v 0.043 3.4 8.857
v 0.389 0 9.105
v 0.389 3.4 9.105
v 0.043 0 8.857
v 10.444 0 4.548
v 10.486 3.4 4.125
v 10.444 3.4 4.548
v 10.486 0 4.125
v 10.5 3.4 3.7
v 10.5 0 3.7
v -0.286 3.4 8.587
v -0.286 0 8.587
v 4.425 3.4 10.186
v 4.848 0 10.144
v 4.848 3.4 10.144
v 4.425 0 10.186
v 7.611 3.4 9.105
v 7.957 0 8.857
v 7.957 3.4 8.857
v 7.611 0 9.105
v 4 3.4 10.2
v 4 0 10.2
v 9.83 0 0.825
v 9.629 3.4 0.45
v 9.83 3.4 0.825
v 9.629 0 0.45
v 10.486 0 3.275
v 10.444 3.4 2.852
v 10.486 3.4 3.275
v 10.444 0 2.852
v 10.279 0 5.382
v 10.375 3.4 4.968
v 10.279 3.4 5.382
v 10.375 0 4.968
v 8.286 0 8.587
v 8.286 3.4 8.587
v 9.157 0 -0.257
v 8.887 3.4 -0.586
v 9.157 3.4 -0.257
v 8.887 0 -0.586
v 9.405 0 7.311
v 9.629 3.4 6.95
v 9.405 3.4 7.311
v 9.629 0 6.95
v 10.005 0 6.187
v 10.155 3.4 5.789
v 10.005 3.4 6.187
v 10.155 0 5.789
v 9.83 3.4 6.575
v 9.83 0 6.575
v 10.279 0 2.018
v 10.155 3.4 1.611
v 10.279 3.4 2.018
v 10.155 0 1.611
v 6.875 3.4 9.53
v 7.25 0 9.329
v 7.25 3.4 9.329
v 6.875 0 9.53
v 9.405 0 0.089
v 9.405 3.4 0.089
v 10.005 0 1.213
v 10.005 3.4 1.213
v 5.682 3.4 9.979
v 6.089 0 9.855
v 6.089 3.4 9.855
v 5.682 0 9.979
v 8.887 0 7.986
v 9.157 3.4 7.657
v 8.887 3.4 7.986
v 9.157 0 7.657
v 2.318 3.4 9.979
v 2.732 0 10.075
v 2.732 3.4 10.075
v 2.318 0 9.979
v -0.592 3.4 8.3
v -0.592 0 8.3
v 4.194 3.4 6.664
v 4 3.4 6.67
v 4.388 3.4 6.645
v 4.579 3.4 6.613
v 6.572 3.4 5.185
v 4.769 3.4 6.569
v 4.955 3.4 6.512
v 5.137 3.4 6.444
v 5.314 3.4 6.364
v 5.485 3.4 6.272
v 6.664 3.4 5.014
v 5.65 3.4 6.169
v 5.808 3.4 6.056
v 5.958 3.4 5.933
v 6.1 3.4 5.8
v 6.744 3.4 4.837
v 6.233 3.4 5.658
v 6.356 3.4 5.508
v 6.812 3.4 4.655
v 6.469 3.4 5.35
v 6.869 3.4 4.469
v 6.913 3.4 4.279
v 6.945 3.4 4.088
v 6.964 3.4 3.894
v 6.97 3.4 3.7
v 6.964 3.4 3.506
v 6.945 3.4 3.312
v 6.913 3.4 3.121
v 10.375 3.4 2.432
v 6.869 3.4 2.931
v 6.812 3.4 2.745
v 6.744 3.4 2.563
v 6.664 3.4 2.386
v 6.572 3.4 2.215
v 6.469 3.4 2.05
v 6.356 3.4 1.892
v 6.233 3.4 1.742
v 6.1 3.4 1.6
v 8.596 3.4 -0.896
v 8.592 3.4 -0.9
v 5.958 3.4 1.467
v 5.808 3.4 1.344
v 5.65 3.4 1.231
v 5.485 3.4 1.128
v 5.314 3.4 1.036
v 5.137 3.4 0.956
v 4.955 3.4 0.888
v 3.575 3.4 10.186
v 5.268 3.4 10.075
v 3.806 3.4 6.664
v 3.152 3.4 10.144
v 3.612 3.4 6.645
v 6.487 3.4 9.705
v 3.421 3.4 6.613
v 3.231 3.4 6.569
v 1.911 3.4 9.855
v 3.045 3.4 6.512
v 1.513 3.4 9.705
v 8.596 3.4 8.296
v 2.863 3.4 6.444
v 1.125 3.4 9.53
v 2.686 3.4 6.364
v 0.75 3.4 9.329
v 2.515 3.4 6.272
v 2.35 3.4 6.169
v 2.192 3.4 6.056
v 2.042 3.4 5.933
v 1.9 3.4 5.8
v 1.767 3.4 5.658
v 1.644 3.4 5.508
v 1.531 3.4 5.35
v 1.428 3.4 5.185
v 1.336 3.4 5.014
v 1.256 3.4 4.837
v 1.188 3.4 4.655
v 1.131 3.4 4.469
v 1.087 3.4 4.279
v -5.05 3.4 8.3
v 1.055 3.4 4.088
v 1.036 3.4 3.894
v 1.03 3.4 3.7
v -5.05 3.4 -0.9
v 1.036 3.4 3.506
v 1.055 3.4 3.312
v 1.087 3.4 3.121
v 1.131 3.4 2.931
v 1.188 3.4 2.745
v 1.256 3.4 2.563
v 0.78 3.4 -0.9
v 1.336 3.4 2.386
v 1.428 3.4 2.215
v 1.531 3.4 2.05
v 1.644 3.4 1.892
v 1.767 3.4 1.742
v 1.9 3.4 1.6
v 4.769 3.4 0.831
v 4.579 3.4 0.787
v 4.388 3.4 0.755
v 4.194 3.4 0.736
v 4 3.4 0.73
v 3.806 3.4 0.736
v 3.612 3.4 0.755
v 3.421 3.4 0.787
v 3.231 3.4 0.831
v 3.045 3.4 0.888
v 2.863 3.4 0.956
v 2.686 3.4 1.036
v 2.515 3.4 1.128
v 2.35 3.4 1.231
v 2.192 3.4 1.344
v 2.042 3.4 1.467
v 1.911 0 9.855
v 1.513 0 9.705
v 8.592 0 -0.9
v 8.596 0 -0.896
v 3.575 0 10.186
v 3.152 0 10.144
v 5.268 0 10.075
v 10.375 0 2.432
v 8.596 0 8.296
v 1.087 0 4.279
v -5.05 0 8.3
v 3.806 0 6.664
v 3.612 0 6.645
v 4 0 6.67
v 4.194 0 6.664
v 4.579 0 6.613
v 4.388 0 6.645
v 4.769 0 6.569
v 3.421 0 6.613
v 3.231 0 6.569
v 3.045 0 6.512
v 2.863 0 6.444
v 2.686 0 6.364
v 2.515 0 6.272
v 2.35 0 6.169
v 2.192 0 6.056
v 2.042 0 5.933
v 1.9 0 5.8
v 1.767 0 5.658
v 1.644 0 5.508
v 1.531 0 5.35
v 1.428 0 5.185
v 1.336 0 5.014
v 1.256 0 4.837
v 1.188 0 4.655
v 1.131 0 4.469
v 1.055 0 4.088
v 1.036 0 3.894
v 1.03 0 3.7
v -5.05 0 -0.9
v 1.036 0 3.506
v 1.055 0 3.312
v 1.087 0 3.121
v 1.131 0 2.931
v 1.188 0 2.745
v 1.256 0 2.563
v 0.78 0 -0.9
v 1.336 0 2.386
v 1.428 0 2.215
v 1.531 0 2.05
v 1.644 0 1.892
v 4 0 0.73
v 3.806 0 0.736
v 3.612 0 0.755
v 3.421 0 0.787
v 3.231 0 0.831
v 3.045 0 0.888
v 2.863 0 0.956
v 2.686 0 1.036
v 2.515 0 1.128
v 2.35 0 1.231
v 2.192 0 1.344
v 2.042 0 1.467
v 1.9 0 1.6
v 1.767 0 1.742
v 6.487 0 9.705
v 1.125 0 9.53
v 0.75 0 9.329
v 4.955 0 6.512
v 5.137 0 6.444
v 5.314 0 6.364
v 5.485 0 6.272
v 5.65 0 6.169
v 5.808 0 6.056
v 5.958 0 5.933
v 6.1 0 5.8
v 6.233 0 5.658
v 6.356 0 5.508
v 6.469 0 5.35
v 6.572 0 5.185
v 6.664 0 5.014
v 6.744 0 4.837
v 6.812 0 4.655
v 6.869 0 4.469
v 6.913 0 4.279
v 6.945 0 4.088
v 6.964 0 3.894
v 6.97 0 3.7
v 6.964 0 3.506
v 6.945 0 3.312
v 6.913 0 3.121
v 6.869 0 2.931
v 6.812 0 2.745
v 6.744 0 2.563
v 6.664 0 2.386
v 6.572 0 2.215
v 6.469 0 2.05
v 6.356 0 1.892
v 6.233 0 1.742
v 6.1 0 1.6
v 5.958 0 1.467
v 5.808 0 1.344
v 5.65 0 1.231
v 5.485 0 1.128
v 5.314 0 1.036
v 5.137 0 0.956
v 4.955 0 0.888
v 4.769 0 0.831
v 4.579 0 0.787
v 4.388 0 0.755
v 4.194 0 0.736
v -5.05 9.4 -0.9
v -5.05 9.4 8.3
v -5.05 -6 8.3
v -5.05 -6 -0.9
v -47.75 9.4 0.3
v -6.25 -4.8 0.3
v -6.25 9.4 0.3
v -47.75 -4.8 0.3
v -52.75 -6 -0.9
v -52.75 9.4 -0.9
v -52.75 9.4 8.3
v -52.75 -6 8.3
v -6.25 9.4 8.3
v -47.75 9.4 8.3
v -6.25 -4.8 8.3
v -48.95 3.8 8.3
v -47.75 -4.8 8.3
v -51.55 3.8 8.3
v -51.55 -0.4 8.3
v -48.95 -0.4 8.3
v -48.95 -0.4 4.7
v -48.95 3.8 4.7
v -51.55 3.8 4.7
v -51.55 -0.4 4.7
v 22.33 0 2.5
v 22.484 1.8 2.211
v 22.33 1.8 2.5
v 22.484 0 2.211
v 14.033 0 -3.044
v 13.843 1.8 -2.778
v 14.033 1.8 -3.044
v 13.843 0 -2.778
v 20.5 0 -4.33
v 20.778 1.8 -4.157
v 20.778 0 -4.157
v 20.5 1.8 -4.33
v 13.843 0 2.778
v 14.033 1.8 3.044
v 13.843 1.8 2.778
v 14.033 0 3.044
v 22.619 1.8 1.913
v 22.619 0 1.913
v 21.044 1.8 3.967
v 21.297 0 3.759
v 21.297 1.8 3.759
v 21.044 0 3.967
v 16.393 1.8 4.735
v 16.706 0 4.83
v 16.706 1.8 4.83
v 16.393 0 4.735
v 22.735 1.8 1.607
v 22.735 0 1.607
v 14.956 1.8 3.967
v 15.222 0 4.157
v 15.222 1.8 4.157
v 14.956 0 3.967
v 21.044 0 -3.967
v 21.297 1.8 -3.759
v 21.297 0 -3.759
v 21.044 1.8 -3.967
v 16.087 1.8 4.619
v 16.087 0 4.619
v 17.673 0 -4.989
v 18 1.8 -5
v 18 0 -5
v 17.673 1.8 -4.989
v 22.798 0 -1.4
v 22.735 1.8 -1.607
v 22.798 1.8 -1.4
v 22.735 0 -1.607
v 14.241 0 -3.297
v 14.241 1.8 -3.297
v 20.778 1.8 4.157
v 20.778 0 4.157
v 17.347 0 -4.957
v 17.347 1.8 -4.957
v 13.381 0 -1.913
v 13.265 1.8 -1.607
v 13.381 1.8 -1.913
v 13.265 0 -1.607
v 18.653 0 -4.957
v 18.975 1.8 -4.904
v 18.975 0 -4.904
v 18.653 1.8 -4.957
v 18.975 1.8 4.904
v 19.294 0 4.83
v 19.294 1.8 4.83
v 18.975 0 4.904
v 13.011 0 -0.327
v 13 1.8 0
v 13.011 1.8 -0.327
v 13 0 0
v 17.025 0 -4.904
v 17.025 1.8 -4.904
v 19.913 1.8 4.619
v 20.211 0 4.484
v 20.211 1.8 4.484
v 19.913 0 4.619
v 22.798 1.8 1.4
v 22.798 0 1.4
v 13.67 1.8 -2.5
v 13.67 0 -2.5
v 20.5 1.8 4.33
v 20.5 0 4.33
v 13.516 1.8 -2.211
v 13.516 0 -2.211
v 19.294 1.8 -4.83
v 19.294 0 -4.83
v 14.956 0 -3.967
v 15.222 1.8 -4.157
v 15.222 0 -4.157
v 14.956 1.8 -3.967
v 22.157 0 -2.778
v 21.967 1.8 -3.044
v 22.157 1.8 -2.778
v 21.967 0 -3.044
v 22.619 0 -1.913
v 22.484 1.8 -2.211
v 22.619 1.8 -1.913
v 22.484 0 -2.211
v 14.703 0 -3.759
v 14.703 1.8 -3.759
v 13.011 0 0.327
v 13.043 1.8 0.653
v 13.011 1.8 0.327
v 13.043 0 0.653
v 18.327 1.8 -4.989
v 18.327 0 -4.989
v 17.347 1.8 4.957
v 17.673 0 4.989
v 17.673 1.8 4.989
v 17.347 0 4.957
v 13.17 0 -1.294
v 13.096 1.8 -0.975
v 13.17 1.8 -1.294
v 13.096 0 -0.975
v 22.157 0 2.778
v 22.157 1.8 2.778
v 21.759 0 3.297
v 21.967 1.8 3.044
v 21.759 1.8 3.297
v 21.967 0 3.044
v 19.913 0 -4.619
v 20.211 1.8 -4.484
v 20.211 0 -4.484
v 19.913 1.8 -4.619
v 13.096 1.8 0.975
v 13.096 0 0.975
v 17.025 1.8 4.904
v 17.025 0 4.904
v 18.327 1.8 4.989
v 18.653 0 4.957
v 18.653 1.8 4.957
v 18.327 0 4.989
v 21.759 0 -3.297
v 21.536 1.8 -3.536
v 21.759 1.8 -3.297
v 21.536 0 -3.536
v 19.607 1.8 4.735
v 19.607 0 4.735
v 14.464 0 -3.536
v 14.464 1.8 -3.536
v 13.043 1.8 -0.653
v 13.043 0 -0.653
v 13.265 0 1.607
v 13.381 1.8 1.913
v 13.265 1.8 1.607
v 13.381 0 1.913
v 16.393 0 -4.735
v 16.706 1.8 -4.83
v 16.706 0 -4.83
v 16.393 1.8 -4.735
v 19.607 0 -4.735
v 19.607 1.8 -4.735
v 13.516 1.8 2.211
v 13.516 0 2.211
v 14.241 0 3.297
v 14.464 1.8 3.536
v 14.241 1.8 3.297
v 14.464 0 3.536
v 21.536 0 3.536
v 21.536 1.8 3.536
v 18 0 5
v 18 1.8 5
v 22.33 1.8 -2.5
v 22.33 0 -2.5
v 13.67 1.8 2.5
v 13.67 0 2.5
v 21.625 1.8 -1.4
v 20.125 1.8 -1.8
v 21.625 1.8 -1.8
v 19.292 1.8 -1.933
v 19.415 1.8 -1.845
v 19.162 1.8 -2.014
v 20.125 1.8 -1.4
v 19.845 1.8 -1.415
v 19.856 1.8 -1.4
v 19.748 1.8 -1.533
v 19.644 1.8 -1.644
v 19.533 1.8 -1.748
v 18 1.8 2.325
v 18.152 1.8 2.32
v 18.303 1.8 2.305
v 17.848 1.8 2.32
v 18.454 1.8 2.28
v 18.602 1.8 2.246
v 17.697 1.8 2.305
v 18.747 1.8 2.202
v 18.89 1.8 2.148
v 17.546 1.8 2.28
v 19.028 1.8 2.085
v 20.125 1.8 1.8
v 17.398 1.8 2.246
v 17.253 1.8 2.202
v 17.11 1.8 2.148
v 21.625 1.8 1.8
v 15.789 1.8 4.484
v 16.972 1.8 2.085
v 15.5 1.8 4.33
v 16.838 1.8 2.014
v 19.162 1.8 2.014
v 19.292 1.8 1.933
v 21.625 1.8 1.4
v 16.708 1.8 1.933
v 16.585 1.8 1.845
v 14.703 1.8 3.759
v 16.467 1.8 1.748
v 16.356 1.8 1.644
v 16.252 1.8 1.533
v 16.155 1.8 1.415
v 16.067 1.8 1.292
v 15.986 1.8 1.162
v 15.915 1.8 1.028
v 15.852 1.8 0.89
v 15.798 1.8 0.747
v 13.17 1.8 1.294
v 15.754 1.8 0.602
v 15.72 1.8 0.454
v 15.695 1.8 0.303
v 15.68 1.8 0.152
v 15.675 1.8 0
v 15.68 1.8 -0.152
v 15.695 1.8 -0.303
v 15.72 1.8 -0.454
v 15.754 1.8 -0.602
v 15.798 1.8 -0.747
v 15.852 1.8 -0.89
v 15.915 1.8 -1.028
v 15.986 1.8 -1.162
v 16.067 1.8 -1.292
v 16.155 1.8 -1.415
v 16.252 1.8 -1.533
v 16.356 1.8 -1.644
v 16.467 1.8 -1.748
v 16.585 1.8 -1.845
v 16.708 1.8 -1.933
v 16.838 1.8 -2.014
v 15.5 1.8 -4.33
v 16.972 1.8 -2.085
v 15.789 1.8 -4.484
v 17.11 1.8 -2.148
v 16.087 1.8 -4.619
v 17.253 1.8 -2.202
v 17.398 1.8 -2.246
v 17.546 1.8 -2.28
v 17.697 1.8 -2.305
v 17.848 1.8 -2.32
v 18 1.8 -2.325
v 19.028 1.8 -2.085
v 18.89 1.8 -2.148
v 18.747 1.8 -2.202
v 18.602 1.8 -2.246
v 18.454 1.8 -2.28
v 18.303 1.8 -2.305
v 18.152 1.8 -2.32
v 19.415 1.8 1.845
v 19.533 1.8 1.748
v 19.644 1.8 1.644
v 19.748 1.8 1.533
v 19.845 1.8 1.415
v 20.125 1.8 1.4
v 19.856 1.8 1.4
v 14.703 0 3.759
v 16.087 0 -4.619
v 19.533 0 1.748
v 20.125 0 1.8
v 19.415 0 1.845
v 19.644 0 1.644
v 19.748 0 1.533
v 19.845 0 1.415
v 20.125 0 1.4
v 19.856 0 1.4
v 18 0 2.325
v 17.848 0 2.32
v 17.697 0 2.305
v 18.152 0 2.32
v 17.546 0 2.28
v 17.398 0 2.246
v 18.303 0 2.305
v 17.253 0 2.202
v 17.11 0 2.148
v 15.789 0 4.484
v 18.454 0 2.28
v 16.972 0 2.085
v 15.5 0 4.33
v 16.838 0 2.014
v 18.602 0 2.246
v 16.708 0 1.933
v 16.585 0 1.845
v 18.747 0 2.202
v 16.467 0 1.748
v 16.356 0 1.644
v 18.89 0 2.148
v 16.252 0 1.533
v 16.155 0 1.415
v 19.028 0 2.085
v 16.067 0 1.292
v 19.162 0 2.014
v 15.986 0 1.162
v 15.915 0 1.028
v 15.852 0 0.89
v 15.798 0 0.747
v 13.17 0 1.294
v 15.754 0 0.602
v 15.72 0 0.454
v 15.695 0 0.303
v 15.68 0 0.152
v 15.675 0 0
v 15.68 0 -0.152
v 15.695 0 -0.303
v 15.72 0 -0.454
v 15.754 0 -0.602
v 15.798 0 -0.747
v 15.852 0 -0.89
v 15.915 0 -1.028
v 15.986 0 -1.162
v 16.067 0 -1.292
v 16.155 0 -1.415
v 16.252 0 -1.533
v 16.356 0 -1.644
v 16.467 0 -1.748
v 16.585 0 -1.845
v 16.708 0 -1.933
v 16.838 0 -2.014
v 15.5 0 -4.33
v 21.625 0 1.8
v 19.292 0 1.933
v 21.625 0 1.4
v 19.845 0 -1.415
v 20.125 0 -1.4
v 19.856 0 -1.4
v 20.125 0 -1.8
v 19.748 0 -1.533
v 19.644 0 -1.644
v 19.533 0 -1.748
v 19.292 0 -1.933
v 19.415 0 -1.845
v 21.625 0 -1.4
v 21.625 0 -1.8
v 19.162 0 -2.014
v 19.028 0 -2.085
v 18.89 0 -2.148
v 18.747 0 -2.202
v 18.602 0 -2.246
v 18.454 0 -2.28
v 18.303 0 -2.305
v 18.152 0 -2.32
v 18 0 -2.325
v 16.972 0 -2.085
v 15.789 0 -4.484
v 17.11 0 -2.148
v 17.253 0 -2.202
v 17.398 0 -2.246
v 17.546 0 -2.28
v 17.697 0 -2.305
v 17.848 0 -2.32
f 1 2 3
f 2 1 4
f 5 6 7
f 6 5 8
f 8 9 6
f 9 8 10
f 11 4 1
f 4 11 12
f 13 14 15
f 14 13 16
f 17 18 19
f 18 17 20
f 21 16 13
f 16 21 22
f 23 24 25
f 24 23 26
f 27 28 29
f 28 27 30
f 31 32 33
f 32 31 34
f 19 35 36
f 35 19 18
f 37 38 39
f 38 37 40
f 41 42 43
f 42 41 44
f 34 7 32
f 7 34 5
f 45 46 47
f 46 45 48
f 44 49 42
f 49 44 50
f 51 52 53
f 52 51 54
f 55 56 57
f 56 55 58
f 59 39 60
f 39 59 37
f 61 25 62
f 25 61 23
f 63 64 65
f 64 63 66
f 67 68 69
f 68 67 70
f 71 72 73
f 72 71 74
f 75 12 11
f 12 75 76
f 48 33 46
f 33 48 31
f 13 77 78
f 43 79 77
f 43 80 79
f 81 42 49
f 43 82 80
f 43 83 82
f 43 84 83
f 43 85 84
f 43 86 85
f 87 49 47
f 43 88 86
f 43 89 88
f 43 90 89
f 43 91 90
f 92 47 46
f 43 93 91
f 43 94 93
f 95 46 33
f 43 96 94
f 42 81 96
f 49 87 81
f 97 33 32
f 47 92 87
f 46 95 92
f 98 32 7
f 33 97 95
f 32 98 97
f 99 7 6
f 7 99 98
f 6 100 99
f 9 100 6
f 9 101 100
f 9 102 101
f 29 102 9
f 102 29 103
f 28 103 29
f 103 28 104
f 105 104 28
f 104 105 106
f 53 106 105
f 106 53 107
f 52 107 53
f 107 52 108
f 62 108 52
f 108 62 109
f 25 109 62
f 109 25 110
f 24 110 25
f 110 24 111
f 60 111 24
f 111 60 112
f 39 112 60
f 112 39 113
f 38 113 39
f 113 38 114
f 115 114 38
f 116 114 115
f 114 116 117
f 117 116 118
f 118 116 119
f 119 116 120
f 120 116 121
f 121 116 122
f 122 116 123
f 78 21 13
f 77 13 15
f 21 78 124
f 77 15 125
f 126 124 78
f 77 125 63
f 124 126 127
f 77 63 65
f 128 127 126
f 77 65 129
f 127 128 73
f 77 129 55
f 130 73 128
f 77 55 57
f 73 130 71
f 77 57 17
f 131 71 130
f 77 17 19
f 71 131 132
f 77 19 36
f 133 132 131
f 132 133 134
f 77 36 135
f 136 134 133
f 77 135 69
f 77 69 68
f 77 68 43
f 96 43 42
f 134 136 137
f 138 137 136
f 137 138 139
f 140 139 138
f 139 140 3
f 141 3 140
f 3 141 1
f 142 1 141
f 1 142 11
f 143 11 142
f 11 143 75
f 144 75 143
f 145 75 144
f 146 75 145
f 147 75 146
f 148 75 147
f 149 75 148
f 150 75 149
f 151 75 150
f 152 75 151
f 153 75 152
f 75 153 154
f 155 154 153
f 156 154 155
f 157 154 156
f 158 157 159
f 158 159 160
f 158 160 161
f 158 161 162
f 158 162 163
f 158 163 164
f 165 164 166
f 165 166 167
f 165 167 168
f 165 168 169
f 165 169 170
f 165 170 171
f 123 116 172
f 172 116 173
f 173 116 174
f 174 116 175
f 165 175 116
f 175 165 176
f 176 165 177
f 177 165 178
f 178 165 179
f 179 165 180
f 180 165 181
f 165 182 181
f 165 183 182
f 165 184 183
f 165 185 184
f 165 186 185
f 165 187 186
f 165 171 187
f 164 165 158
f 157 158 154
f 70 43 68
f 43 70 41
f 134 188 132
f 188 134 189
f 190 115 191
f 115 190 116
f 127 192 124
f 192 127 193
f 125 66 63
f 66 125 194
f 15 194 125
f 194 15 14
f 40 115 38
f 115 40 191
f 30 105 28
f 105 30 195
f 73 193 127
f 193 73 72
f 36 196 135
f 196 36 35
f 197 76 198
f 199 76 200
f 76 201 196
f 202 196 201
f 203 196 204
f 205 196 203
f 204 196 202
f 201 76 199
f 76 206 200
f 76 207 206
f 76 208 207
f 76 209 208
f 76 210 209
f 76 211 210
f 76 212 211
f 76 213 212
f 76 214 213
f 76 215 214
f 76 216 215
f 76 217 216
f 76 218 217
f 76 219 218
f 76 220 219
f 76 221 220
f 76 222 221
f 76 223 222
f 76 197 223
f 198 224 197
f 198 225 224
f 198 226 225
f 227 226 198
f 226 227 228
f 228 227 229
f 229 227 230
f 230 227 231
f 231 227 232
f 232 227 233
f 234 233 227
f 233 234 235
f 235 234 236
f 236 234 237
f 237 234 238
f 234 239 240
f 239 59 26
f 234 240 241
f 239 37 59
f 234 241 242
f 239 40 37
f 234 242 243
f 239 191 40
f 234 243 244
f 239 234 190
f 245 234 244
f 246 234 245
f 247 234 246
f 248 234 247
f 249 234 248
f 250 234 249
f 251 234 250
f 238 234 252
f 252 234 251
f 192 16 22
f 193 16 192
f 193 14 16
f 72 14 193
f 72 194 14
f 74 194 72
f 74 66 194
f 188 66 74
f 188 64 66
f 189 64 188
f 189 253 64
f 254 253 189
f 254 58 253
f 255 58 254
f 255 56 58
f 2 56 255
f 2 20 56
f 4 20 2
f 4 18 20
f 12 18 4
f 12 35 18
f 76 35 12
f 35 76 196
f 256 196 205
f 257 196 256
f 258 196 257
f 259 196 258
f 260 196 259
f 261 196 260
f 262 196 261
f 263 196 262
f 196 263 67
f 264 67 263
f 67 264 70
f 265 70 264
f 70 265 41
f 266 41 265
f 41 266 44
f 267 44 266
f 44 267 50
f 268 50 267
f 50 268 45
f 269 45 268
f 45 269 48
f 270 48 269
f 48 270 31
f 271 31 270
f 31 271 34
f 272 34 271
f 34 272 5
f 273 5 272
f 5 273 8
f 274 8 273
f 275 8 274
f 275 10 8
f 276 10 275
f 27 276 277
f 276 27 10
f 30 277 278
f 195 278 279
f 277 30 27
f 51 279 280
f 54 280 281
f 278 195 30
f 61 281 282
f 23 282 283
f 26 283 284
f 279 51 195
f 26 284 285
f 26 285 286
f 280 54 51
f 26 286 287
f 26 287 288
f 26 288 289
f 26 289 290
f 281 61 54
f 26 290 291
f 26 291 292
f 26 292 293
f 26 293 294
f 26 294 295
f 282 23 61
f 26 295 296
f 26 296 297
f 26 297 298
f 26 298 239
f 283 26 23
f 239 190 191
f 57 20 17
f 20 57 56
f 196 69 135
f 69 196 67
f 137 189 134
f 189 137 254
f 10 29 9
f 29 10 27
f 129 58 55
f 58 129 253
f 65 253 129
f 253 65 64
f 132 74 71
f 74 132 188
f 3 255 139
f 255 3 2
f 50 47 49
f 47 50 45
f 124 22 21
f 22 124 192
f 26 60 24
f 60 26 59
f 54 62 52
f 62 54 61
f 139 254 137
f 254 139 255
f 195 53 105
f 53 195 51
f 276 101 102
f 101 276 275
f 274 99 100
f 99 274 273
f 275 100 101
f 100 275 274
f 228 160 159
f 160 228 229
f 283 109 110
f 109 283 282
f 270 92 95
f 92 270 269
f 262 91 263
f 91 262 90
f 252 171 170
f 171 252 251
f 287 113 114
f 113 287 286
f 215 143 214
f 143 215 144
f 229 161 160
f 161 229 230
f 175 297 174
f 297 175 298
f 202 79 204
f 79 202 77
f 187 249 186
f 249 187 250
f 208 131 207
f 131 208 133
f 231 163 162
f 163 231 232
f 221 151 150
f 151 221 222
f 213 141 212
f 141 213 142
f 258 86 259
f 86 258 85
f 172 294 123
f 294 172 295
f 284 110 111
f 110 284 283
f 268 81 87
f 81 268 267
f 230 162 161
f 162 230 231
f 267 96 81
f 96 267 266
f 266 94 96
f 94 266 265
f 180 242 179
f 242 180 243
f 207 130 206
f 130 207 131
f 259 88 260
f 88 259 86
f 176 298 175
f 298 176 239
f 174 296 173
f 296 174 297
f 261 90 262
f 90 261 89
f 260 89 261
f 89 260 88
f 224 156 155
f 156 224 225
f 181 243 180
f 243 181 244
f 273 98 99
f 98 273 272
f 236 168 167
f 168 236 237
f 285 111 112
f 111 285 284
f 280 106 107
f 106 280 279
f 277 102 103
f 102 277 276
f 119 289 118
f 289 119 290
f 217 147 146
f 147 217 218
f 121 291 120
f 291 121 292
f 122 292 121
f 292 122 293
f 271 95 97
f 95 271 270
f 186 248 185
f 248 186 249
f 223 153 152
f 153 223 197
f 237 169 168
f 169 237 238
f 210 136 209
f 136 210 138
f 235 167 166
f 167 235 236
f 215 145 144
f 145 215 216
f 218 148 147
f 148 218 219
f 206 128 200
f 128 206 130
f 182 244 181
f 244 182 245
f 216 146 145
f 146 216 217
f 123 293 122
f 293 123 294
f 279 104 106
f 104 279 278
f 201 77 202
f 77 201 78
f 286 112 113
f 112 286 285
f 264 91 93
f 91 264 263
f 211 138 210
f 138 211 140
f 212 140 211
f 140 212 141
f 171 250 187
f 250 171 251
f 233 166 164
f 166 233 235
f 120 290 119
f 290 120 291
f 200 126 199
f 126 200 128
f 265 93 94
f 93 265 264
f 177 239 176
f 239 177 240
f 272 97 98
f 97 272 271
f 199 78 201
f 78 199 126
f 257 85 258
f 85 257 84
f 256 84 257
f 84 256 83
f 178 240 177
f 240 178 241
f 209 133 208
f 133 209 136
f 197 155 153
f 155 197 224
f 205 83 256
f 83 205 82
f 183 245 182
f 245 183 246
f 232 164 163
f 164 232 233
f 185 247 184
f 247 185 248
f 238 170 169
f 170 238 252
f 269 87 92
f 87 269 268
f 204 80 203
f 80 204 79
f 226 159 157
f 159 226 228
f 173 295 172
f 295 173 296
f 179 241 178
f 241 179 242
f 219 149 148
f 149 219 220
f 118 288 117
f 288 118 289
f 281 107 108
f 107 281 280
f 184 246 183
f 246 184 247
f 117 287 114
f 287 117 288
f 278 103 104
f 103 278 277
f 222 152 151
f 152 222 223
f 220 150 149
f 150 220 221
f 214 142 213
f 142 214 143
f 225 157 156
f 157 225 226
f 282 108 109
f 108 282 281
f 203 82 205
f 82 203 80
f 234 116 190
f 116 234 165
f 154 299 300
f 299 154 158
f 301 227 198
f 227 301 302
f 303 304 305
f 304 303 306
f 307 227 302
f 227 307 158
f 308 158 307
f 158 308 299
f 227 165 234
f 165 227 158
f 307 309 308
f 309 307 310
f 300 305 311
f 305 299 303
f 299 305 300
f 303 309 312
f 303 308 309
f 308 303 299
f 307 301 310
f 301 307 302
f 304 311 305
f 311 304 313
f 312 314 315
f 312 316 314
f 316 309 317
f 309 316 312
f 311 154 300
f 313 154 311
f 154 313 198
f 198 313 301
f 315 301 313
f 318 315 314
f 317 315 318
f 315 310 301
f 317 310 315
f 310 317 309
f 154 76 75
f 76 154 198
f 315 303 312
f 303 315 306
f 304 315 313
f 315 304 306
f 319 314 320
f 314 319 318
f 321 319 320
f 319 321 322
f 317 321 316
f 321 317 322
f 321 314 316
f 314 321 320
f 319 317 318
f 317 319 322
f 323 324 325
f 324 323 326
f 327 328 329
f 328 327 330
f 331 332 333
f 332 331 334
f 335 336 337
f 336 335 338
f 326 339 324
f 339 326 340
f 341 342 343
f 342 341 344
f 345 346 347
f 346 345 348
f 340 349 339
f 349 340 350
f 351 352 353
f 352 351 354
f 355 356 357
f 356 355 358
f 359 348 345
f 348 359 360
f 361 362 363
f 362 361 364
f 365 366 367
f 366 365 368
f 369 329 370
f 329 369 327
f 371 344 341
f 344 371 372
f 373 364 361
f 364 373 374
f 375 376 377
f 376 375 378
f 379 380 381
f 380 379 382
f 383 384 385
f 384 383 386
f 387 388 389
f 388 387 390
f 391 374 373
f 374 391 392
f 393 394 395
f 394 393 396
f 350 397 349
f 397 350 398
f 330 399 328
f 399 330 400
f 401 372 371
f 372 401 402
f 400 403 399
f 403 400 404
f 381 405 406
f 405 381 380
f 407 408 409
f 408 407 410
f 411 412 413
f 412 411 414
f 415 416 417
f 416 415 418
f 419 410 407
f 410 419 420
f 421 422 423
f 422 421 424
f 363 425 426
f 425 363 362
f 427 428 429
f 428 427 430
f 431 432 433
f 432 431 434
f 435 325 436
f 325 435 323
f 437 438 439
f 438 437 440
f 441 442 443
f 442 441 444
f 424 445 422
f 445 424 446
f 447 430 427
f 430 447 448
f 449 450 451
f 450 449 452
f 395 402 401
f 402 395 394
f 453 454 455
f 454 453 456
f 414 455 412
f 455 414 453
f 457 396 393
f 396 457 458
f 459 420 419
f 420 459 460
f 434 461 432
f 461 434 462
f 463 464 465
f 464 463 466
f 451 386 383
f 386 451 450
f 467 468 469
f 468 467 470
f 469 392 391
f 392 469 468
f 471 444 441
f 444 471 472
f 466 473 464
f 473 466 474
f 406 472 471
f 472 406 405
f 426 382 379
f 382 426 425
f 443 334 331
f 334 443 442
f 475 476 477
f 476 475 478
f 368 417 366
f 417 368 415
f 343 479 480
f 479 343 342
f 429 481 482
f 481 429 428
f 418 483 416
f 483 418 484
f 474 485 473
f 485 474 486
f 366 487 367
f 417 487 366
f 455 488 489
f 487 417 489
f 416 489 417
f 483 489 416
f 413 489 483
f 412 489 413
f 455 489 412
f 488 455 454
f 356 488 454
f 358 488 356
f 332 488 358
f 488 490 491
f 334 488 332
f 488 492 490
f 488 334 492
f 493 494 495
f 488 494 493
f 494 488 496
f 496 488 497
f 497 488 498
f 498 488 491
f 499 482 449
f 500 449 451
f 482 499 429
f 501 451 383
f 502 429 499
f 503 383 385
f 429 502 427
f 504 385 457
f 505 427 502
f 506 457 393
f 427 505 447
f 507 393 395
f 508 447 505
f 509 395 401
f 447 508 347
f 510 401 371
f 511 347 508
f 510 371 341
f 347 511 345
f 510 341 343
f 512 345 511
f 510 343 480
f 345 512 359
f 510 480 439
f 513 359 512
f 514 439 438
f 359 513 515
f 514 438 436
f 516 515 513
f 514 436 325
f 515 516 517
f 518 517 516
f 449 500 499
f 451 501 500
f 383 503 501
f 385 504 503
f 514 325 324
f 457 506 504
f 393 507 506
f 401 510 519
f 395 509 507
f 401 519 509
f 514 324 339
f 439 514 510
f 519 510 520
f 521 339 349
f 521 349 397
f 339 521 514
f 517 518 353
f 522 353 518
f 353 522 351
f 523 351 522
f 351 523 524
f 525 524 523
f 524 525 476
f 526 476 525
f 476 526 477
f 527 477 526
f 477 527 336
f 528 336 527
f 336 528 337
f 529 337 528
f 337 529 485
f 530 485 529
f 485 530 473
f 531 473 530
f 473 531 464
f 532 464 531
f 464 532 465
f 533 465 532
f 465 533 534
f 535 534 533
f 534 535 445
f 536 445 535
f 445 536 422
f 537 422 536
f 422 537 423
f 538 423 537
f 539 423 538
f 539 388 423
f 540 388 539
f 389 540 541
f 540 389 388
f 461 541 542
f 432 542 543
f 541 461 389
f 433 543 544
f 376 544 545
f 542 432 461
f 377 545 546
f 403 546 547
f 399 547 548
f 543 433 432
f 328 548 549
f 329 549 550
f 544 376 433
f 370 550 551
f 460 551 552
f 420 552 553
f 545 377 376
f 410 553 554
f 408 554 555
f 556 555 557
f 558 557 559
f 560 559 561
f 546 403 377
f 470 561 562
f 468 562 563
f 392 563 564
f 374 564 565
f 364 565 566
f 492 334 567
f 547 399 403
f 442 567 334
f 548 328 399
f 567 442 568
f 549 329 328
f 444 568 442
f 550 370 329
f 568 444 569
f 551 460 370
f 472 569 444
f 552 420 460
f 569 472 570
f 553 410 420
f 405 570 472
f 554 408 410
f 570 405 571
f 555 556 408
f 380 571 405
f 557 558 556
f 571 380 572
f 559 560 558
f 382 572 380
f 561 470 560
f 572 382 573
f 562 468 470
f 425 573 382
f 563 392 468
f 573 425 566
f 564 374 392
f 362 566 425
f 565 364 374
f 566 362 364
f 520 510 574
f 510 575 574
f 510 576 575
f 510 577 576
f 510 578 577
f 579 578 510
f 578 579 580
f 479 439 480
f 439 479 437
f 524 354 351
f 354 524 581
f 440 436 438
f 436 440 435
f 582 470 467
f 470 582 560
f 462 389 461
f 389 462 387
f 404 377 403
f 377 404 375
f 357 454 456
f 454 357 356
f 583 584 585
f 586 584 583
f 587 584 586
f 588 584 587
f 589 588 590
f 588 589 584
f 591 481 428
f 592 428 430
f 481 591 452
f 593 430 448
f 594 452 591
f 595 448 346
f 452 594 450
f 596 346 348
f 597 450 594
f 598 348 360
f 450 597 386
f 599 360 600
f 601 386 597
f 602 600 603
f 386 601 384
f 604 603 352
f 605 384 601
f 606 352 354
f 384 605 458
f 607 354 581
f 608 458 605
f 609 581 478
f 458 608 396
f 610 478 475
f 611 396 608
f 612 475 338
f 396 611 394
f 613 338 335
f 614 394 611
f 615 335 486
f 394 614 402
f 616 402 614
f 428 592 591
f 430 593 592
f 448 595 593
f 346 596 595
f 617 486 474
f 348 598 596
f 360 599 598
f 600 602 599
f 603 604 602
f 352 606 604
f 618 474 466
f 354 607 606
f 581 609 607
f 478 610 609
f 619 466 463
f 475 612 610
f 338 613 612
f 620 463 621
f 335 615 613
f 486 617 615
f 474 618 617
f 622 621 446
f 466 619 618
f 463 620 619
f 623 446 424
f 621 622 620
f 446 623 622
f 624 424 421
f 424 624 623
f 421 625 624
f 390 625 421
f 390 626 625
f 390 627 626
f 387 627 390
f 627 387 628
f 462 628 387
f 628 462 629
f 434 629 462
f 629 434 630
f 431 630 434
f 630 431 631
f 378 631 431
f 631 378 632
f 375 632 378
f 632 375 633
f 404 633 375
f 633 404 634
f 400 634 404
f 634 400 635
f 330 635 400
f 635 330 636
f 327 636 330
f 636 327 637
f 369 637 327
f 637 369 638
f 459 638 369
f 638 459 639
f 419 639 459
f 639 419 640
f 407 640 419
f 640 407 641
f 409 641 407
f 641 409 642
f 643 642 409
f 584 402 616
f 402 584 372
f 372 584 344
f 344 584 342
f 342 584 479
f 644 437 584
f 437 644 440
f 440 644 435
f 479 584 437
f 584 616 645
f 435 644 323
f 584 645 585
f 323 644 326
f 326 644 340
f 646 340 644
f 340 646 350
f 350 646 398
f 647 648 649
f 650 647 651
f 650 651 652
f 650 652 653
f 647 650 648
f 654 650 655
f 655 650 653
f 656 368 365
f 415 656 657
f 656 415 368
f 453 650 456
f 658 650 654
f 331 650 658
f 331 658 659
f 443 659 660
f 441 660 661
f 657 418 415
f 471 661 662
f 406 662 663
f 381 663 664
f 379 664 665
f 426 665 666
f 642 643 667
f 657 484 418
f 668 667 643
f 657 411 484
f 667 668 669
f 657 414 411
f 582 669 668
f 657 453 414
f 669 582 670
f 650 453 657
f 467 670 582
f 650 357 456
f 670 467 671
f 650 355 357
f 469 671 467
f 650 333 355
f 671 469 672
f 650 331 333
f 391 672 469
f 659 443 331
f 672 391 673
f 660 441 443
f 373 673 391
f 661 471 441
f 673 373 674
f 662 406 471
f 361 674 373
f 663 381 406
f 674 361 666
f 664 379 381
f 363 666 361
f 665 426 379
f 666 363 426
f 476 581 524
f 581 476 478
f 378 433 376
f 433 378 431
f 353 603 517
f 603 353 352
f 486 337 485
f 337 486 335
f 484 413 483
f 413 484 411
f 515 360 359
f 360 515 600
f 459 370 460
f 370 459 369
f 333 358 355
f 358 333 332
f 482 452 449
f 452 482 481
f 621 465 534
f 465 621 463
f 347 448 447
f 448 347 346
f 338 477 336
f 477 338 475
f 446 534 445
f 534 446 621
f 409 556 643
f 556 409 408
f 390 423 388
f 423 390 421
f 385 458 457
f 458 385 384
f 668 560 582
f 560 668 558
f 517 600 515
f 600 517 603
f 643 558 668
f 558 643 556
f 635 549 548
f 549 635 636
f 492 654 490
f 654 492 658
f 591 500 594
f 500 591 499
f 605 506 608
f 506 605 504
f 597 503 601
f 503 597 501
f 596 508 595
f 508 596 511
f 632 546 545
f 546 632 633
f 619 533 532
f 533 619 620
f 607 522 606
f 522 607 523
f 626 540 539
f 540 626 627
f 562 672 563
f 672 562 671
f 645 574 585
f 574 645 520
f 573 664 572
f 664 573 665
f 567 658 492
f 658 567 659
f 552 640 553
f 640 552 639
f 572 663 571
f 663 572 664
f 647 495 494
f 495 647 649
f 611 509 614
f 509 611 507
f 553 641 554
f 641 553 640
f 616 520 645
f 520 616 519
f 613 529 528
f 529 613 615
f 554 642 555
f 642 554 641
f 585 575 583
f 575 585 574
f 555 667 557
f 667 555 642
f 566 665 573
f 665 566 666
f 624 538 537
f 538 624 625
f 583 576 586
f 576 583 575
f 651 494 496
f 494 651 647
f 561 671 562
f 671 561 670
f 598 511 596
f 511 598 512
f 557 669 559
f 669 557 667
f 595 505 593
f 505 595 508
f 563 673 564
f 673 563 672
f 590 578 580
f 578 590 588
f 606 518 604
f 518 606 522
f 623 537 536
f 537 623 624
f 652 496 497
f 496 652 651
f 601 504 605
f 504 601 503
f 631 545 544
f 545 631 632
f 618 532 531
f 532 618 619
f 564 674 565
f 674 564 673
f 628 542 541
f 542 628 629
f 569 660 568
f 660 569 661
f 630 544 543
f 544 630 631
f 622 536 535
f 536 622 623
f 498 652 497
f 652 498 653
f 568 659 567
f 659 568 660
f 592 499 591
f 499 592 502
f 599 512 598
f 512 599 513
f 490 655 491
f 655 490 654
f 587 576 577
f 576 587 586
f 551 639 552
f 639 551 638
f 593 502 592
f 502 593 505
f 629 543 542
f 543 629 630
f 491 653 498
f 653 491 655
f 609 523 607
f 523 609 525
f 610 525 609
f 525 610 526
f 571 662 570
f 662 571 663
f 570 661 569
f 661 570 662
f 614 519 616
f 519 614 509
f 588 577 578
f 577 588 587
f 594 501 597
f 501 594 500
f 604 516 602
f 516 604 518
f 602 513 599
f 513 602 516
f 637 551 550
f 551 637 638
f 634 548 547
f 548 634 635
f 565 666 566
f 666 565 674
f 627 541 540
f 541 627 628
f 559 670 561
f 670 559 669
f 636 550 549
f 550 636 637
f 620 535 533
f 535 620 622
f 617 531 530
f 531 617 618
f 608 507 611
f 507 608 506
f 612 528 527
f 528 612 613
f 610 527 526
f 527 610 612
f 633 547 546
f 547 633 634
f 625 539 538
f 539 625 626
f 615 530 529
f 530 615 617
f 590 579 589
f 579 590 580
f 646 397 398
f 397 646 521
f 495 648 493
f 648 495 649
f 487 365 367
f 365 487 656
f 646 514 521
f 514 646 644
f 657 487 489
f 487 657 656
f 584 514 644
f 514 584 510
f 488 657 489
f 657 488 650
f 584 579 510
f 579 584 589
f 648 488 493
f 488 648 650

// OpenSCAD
// DOUBLE TAKE FRAMES DESIGN RELEASE
// DTF_RELEASE: 2.0.4
// Released: 2026-09-15
// Versioning: Semantic Versioning 2.0.0 (https://semver.org/)
// Status: CANONICAL
// Changes in 2.0.4:
// - Carried forward unchanged for the coordinated capstan and clock-string-guide release.
// Changes in 2.0.3:
// - Carried forward unchanged for the corrected prepared-project packaging.
// Changes in 2.0.2:
// - Carried forward unchanged for the native 3MF packaging hotfix.
// Changes in 2.0.1:
// - Carried forward unchanged for the prepared-project packaging correction.
// Changes in 2.0.0:
// - Carried forward without geometry changes for the coordinated 2.0.0 release.
// Full release notes: https://doubletakeframes.com/build/#design-release
//
$fn = 96;

eps = 0.05;

// 0 = separated printable latch and keeper
// 1 = FN-weight latch only
// 2 = C-shaped keeper only
render_part = 0;

// =========================================================
// FN WEIGHT LATCH
// =========================================================
post_d = 5.5;
clear_radial = 0.22;
eye_inner_d = post_d + 2 * clear_radial;
eye_outer_d = 13.0;

latch_t = 3.4;
pivot_x = 4.0;

corral_clear_w_x = 41.5;
corral_clear_d_y = 13.0;
corral_wall_t = 1.2;
corral_depth_z = 8.0;
corral_floor_t = 1.2;
corral_end_wall_t_x = 5.0;
canonical_weight_center_x = -27.0;

// Match the installed latch plane used by the canonical dry-wall rig.
standoff_h = 0.8;
post_h = 4.0;
corral_global_outer_y1 = -0.30;
corral_center_y_target = corral_global_outer_y1
                         - (corral_clear_d_y + 2 * corral_wall_t) / 2;
pad_t = -corral_center_y_target - standoff_h - post_h / 2;
post_y1 = -pad_t - standoff_h - post_h;
latch_install_y = post_y1 + (post_h - latch_t) / 2;

corral_inner_x0 = canonical_weight_center_x - corral_clear_w_x / 2;
corral_inner_x1 = canonical_weight_center_x + corral_clear_w_x / 2;
corral_floor_x0 = corral_inner_x0 - corral_end_wall_t_x;
corral_floor_x1 = corral_inner_x1 + corral_wall_t;

corral_outer_y1 = corral_global_outer_y1 - latch_install_y;
corral_inner_y1 = corral_outer_y1 - corral_wall_t;
corral_inner_y0 = corral_inner_y1 - corral_clear_d_y;
corral_outer_y0 = corral_inner_y0 - corral_wall_t;

corral_floor_z0 = -0.90;
corral_floor_z = corral_floor_z0 + corral_floor_t;
corral_wall_z1 = corral_floor_z + corral_depth_z;
pivot_z = (corral_floor_z0 + corral_wall_z1) / 2;
pivot_eye_flat_local_z = corral_floor_z0 - pivot_z;

pivot_transition_x0 = corral_floor_x1;
pivot_transition_x1 = pivot_x - (eye_inner_d / 2 + 0.25);

// Far-end Y-retention socket. The matching roof-hung tooth belongs to the
// fixed dry-wall rig; this socket is open at the top so the latch disengages
// cleanly as it swings downward.
latch_key_tooth_w_x = 1.4;
latch_key_tooth_w_y = 3.0;
latch_key_clear_xy = 0.60;
latch_key_clear_z = 0.60;
latch_key_engagement_z = 3.0;

latch_key_xc = (corral_floor_x0 + corral_inner_x0) / 2;
latch_key_local_yc = (corral_outer_y0 + corral_outer_y1) / 2;
latch_key_notch_x0 = latch_key_xc - latch_key_tooth_w_x / 2
                     - latch_key_clear_xy;
latch_key_notch_x1 = latch_key_xc + latch_key_tooth_w_x / 2
                     + latch_key_clear_xy;
latch_key_notch_y0 = latch_key_local_yc - latch_key_tooth_w_y / 2
                     - latch_key_clear_xy;
latch_key_notch_y1 = latch_key_local_yc + latch_key_tooth_w_y / 2
                     + latch_key_clear_xy;
latch_key_notch_z0 = corral_wall_z1 - latch_key_engagement_z
                     - latch_key_clear_z;

// =========================================================
// C-SHAPED KEEPER
// =========================================================
clip_outer_d = 10.0;
clip_t = 1.8;
grip_hole_d = 4.65;
gap_w = 2.8;
flat_depth = 1.5;

// =========================================================
// HELPERS
// =========================================================
module rect_prism(x0, x1, y0, y1, z0, z1) {
    translate([min(x0, x1), min(y0, y1), min(z0, z1)])
        cube([abs(x1 - x0), abs(y1 - y0), abs(z1 - z0)]);
}

module cyl_y_span(d, y0, y1) {
    translate([0, max(y0, y1), 0])
        rotate([90, 0, 0])
            cylinder(d=d, h=abs(y1 - y0), center=false);
}

// =========================================================
// PRINTABLE PARTS
// =========================================================
module canonical_latch_core() {
    translate([pivot_x, 0, pivot_z])
        difference() {
            cyl_y_span(eye_outer_d, 0, latch_t);
            cyl_y_span(eye_inner_d, -0.1, latch_t + 0.2);

            // Flatten only the unused lower eye arc so the complete latch
            // prints on the same plane as the corral floor.
            rect_prism(-eye_outer_d / 2 - 1,
                       eye_outer_d / 2 + 1,
                       -0.1, latch_t + 0.2,
                       -eye_outer_d / 2 - 1,
                       pivot_eye_flat_local_z);
        }
}

module fn_weight_corral() {
    difference() {
        union() {
            // Shallow floor beneath the weight pocket and keyed extension.
            rect_prism(corral_floor_x0, corral_floor_x1,
                       corral_outer_y0, corral_outer_y1,
                       corral_floor_z0, corral_floor_z);

            // Viewer-facing wall. The frame wall closes the opposite side.
            rect_prism(corral_inner_x0, corral_inner_x1,
                       corral_outer_y0, corral_inner_y0,
                       corral_floor_z, corral_wall_z1);

            // Pivot-side wall.
            rect_prism(corral_inner_x1, corral_floor_x1,
                       corral_outer_y0, corral_outer_y1,
                       corral_floor_z, corral_wall_z1);

            // Substantial far-end wall carrying the retention socket.
            rect_prism(corral_floor_x0, corral_inner_x0,
                       corral_outer_y0, corral_outer_y1,
                       corral_floor_z, corral_wall_z1);

            // Compact load path from the corral into the pivot eye.
            rect_prism(pivot_transition_x0, pivot_transition_x1,
                       0, latch_t,
                       corral_floor_z0, corral_wall_z1);
        }

        rect_prism(latch_key_notch_x0, latch_key_notch_x1,
                   latch_key_notch_y0, latch_key_notch_y1,
                   latch_key_notch_z0, corral_wall_z1 + eps);
    }
}

module swinging_latch() {
    union() {
        canonical_latch_core();
        fn_weight_corral();
    }
}

module c_keeper() {
    difference() {
        cyl_y_span(clip_outer_d, 0, clip_t);
        cyl_y_span(grip_hole_d, -0.1, clip_t + 0.2);

        rect_prism(0, clip_outer_d / 2 + 0.5,
                   -0.1, clip_t + 0.1,
                   -gap_w / 2, gap_w / 2);

        rect_prism(grip_hole_d / 2 - 0.2,
                   grip_hole_d / 2 - 0.2 + flat_depth,
                   -0.1, clip_t + 0.1,
                   -gap_w / 2 - 0.4, gap_w / 2 + 0.4);
    }
}

assert(corral_clear_w_x == 41.5);
assert(corral_clear_d_y == 13.0);
assert(pivot_transition_x1 > pivot_transition_x0);

if (render_part == 1)
    swinging_latch();
else if (render_part == 2)
    c_keeper();
else {
    swinging_latch();
    translate([18, 0, 0]) c_keeper();
}
